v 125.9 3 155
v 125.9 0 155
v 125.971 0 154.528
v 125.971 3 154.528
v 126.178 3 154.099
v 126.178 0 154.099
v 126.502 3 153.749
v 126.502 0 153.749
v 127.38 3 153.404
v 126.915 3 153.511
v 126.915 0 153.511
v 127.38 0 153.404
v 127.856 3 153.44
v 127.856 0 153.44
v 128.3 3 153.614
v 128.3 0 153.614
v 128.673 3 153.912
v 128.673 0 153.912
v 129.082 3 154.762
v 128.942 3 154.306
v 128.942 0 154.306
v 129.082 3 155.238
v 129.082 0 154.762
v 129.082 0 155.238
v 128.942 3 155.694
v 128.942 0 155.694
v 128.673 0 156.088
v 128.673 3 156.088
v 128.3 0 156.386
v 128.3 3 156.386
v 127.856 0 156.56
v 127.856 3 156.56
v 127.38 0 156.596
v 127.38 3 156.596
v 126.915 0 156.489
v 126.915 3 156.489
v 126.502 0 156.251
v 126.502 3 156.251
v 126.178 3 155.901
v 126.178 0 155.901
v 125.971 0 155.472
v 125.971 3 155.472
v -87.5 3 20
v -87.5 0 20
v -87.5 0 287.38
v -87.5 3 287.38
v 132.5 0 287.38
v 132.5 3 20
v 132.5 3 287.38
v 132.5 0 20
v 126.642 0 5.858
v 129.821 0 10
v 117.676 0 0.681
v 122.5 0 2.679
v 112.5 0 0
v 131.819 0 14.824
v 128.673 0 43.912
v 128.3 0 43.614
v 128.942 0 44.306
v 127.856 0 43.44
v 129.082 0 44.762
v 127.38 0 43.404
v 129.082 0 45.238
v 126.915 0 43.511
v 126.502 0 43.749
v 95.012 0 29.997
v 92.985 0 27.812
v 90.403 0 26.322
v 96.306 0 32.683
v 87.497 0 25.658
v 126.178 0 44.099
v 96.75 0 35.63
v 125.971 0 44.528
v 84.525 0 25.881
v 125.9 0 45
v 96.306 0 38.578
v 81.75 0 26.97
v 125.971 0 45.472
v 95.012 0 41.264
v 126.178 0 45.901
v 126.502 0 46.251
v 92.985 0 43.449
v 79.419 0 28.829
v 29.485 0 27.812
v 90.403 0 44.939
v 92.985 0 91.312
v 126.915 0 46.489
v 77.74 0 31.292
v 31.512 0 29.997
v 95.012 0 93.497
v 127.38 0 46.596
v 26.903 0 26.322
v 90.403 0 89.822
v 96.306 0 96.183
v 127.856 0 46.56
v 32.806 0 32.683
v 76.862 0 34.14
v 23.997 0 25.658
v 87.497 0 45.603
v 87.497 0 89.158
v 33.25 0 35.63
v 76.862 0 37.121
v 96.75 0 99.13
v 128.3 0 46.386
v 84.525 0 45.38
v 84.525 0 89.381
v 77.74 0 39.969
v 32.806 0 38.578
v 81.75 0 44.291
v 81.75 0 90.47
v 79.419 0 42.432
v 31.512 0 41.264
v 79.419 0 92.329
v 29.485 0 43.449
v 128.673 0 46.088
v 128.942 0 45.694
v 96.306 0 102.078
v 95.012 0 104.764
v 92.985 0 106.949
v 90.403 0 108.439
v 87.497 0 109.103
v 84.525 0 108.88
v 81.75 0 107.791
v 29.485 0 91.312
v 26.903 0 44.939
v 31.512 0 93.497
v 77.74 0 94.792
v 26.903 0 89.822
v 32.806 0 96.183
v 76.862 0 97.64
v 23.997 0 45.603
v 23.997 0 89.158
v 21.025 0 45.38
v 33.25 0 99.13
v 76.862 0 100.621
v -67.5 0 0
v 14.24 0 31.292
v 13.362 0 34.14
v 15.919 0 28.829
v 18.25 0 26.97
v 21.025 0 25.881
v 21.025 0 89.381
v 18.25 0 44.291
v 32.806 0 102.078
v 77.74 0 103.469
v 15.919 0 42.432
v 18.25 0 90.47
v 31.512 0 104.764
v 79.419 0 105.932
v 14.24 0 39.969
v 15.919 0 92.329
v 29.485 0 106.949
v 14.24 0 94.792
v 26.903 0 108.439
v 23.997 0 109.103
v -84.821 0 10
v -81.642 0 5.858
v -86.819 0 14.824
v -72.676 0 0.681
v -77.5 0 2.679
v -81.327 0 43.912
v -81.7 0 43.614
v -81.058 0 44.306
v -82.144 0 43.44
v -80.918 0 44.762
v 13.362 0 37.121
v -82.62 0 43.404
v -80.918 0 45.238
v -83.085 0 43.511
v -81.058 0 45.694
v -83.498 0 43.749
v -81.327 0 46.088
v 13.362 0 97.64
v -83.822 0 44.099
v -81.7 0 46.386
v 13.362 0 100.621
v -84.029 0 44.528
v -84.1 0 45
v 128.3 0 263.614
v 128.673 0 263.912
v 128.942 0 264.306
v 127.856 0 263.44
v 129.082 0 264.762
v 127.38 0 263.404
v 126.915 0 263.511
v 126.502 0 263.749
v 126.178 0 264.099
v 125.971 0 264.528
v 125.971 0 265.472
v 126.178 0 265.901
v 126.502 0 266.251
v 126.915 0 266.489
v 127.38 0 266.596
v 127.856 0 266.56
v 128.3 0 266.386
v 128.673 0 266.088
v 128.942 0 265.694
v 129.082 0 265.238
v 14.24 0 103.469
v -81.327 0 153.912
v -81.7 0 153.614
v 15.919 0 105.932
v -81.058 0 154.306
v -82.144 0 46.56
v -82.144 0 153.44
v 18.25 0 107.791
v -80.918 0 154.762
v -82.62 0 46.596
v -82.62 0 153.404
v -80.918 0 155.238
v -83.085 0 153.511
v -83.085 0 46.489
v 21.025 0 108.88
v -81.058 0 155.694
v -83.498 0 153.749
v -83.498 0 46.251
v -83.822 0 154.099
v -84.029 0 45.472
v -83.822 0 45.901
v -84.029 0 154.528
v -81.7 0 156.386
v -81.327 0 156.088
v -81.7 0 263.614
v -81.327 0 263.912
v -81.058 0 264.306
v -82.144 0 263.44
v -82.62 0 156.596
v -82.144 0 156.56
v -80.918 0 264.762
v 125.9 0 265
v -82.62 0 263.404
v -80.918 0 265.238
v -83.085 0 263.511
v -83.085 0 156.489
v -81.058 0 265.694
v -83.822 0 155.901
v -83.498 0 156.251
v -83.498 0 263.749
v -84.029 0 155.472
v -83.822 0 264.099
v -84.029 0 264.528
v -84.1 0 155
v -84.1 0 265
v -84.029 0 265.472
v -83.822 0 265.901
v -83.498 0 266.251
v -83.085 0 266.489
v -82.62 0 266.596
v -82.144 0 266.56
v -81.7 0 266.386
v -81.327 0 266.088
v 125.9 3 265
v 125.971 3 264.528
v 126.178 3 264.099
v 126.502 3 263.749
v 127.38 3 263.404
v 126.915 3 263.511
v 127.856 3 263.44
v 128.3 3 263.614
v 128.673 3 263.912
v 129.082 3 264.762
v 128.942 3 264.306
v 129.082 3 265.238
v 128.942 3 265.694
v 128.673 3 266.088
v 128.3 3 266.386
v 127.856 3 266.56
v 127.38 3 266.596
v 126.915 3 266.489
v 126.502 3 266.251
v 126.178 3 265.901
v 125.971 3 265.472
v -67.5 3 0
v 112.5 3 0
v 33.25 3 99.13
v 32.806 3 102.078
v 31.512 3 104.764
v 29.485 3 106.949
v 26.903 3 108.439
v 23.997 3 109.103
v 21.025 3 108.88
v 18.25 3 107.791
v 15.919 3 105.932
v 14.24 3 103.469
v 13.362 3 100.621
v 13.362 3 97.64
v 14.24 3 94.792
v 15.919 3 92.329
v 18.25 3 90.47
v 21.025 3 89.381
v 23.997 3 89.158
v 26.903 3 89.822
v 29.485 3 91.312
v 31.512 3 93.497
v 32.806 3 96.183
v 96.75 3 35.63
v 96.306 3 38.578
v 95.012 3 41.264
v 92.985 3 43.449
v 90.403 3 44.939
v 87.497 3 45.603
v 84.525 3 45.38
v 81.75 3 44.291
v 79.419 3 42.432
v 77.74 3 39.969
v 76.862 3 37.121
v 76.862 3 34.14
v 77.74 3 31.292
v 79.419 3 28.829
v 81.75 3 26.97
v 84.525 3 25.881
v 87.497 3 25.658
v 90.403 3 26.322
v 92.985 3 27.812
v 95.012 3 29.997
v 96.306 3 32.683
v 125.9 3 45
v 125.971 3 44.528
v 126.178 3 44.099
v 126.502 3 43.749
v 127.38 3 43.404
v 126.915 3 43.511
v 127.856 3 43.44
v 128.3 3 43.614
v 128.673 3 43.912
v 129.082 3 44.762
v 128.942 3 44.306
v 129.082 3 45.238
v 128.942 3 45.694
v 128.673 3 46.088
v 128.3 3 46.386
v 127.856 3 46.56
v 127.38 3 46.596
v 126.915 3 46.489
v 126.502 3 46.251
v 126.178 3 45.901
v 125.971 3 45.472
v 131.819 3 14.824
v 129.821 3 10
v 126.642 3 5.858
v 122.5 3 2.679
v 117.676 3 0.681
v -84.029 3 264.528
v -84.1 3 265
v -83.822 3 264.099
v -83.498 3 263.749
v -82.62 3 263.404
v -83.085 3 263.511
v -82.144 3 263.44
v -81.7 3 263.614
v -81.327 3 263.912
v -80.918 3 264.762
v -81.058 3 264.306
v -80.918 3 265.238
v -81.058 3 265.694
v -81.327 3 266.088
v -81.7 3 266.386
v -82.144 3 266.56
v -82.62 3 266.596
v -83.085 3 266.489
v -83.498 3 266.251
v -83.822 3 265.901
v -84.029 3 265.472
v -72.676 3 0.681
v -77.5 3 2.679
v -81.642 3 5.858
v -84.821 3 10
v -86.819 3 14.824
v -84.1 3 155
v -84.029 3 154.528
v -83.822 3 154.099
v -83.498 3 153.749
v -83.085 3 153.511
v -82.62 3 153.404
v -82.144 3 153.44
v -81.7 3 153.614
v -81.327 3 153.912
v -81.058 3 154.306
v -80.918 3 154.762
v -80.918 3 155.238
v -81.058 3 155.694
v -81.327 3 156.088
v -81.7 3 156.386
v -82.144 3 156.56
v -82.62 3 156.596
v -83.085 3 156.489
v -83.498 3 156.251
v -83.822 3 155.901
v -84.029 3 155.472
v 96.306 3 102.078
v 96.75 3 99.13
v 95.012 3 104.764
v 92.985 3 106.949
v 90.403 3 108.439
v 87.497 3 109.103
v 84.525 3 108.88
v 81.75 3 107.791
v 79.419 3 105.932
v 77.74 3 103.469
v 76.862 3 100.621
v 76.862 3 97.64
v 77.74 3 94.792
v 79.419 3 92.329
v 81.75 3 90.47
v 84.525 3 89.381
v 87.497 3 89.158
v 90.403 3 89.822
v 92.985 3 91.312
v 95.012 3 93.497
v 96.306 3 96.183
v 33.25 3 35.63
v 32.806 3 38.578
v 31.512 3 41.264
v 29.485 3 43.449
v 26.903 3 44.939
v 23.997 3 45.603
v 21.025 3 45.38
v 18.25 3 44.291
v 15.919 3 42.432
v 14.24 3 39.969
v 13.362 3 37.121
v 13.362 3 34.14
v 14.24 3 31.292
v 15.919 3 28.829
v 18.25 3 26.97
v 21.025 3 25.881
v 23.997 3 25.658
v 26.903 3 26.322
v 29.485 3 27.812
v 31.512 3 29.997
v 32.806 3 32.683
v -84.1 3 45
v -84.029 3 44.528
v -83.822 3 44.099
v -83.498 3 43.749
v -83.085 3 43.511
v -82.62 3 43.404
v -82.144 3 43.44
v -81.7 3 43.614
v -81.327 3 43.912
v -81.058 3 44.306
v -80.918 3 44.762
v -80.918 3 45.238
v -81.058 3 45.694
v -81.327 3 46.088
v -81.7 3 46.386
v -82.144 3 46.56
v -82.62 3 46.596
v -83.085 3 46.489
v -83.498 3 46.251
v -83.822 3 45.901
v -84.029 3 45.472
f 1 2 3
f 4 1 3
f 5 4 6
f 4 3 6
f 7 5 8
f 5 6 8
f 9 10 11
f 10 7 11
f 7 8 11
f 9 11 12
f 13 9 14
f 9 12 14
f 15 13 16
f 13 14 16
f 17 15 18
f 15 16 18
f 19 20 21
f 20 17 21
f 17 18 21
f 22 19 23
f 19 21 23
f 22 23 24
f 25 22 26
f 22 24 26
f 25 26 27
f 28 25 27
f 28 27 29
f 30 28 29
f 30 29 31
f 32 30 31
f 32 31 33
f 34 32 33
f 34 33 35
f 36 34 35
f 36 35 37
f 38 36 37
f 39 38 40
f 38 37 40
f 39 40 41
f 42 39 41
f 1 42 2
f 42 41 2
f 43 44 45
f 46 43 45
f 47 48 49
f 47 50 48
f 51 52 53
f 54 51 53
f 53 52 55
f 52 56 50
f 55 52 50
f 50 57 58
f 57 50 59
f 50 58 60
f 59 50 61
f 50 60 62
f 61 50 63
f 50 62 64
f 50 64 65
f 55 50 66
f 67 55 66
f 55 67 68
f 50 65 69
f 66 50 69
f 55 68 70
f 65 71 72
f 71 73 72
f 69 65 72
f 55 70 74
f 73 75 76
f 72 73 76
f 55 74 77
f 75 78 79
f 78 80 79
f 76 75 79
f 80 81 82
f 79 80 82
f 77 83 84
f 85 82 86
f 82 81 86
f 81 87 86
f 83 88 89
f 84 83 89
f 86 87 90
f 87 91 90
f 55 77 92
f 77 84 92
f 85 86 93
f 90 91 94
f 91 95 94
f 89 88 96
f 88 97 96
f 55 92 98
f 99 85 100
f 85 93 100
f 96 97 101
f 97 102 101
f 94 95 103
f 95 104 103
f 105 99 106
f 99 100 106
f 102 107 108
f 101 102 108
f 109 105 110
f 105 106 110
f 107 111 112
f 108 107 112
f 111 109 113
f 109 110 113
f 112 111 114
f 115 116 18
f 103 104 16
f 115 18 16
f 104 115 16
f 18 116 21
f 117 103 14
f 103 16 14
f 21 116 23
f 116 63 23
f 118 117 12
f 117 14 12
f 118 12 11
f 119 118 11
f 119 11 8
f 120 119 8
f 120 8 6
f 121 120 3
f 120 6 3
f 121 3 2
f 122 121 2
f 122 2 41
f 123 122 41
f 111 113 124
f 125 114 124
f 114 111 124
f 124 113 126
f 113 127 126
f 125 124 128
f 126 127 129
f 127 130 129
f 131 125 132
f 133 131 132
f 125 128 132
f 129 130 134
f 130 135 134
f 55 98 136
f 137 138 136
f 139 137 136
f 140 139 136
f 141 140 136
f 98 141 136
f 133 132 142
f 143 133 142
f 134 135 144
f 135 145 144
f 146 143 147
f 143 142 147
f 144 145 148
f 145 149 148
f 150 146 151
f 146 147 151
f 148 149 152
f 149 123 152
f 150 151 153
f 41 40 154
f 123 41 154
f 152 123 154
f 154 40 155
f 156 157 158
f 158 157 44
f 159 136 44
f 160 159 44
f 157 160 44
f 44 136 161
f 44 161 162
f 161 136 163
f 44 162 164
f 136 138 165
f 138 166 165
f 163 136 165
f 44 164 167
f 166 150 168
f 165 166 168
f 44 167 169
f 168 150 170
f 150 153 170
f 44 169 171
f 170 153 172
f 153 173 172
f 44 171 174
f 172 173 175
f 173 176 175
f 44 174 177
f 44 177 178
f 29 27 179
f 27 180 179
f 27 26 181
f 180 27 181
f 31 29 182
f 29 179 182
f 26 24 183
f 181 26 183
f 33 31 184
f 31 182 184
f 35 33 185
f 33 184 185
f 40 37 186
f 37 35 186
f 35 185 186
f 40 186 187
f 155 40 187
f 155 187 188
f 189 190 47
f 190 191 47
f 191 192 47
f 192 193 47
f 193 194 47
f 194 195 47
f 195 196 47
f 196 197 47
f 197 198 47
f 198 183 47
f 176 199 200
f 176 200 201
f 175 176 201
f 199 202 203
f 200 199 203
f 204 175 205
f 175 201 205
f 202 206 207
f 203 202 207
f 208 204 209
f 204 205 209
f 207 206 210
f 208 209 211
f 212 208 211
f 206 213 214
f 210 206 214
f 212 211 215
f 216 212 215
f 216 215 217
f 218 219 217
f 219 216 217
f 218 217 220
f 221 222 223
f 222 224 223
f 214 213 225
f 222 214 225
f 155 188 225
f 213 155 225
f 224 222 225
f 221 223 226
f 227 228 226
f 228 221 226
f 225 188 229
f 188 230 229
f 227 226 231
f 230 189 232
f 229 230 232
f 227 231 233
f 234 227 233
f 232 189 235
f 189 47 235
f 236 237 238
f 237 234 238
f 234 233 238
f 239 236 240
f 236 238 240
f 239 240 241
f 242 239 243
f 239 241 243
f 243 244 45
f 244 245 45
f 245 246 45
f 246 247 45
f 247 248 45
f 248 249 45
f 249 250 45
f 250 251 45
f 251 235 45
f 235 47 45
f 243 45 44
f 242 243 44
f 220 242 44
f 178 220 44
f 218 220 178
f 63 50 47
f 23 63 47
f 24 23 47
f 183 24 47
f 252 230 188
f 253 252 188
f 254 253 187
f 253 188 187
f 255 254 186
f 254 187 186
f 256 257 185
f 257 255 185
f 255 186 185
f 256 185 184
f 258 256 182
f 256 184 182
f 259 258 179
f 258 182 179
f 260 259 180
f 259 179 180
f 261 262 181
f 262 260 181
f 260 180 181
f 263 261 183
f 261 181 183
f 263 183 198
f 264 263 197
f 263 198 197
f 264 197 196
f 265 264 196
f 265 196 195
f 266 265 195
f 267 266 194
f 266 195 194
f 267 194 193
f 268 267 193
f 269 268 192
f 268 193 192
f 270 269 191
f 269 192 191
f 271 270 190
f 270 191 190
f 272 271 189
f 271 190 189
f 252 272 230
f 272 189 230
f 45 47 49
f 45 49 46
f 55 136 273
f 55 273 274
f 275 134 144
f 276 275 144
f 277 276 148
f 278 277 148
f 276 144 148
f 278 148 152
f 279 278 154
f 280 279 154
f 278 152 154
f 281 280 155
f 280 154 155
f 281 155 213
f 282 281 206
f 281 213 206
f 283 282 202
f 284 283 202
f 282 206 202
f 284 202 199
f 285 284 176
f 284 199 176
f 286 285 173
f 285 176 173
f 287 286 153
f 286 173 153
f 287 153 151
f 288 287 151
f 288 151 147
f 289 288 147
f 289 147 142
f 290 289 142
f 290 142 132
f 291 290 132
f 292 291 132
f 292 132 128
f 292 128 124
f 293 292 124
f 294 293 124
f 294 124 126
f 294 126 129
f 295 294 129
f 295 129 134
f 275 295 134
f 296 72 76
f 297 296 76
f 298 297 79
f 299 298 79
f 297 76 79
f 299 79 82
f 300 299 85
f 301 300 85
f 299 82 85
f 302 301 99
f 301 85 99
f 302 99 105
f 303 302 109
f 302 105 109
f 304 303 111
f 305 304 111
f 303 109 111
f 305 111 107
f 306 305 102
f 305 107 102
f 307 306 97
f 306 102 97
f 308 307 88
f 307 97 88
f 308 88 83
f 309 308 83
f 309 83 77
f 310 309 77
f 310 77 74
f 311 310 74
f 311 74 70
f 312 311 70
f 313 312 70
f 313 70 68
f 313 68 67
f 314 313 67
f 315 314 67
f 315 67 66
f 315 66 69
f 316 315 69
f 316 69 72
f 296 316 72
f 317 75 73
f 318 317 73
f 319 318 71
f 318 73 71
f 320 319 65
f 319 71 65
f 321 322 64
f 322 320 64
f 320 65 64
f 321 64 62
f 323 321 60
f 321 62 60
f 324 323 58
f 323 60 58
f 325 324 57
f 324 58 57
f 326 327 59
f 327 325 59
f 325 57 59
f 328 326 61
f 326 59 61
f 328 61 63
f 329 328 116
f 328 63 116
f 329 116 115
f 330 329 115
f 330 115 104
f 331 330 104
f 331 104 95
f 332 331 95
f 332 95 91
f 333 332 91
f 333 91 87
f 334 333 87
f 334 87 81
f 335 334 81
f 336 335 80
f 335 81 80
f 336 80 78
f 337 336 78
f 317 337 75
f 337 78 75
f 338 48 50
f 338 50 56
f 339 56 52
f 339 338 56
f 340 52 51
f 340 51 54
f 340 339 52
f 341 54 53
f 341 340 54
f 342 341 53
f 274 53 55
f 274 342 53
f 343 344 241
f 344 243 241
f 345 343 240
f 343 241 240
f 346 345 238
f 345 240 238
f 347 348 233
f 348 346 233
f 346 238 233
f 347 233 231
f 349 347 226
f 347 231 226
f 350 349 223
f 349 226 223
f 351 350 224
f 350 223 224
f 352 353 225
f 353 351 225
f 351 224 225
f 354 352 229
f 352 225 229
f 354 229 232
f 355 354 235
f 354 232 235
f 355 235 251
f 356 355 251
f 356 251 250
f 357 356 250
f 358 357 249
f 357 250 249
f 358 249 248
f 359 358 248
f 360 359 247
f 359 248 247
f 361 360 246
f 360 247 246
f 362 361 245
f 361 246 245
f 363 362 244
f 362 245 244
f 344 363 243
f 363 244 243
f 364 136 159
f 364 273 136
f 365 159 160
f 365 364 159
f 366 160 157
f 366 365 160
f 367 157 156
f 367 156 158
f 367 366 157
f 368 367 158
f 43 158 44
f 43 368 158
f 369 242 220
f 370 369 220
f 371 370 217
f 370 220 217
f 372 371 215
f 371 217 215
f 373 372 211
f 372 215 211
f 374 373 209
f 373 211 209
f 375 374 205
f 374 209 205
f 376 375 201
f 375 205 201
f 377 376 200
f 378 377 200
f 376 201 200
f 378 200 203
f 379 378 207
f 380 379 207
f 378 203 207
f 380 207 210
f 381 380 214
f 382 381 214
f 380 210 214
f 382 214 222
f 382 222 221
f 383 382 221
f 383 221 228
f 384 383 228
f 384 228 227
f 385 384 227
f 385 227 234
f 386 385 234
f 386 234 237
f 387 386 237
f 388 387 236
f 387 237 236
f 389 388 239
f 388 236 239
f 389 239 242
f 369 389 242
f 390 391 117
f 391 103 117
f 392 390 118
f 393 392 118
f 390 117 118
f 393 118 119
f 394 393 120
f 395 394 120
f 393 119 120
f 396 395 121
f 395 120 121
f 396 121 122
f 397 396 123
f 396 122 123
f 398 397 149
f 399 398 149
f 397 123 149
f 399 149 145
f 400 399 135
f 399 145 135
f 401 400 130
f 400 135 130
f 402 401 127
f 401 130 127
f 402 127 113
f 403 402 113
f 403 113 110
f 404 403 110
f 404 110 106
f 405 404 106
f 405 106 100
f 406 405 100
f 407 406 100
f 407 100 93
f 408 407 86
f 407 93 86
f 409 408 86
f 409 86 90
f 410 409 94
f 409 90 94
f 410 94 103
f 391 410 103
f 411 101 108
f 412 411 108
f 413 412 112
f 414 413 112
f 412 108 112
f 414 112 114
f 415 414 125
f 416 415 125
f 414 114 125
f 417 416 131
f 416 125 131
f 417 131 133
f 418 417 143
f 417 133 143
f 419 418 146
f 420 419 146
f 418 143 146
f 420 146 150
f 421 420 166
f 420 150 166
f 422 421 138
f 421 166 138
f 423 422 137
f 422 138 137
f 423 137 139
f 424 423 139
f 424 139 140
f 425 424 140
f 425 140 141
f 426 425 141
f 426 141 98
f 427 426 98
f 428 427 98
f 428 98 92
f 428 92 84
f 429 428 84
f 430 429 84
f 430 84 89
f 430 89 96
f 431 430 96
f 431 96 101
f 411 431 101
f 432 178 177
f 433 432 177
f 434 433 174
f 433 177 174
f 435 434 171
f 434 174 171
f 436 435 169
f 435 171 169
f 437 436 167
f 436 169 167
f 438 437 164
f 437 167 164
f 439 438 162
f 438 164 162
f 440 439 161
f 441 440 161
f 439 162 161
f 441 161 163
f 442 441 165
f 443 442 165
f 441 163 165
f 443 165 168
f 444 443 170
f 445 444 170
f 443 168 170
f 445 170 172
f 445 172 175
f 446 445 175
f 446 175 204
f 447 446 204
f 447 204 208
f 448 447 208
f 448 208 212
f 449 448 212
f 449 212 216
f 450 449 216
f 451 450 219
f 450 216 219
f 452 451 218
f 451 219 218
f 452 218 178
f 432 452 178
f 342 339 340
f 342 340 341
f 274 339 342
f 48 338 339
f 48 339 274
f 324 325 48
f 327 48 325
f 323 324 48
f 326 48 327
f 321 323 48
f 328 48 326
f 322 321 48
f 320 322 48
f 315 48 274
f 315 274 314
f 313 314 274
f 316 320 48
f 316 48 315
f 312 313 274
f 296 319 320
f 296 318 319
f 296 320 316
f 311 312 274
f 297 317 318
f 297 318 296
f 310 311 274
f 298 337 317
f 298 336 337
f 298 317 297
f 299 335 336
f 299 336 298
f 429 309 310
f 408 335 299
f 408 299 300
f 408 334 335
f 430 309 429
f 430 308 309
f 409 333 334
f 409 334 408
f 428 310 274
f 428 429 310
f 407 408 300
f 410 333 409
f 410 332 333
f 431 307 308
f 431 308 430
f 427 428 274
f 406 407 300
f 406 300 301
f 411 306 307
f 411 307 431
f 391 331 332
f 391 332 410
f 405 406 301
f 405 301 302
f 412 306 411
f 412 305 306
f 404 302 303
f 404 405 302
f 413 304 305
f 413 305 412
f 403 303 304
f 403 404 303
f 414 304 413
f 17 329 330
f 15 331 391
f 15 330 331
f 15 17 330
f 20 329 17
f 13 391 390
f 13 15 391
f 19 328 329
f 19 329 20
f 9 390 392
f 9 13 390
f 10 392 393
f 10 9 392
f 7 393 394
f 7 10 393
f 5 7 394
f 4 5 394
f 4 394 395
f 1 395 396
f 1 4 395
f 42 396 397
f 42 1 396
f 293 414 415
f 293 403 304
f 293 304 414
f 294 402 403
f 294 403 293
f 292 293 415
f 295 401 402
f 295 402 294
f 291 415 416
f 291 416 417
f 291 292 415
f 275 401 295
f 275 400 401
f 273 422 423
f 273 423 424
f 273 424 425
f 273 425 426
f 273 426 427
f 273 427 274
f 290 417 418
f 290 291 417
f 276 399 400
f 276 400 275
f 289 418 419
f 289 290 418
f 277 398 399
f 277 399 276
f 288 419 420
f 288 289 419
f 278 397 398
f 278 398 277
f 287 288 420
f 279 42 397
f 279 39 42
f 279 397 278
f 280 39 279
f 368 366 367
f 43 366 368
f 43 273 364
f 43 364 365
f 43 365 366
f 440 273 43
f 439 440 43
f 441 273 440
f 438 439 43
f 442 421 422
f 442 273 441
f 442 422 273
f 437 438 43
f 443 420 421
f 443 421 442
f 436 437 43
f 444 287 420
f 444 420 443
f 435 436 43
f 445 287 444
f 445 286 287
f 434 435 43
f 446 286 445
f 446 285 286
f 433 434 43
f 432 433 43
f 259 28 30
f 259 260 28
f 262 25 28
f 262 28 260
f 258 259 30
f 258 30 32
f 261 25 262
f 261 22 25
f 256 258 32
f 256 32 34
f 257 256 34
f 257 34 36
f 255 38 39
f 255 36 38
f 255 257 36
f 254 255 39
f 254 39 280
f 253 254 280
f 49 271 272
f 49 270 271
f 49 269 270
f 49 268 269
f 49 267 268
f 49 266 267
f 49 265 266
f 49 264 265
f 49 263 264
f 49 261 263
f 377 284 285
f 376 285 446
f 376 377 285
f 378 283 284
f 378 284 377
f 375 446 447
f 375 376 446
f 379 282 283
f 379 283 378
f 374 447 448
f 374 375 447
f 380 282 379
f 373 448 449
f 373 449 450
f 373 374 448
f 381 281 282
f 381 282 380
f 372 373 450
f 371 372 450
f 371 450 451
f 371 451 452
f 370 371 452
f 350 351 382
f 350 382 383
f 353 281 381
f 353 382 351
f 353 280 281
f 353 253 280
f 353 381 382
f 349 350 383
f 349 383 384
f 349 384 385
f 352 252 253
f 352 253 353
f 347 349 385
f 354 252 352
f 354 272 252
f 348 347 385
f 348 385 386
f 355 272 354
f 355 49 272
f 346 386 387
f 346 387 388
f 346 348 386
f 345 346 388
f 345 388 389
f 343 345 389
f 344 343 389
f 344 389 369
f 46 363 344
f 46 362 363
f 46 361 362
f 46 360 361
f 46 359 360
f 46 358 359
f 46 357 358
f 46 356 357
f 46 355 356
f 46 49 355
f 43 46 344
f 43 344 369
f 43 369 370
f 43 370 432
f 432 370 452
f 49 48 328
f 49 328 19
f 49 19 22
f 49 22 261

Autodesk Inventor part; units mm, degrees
ref_plane "YZ Plane" through (0, 0, 0) normal (1, 0, 0) x (0, 1, 0)
ref_plane "XZ Plane" through (0, 0, 0) normal (0, 1, 0) x (-1, 0, 0)
ref_plane "XY Plane" through (0, 0, 0) normal (0, 0, 1) x (1, 0, 0)
sketch "Sketch1" plane through (0, 0, 0) normal (0, 1, 0) x (-1, 0, 0)
  line L0 (-132.5, 287.3805) -> (-122.5, 287.3805)
  line L1 (-132.5, 20) -> (-132.5, 287.3805)
  line L2 (-122.5, 20) -> (-122.5, 287.3805)
  line L3 (77.5, 287.3805) -> (87.5, 287.3805)
  line L4 (77.5, 20) -> (77.5, 287.3805)
  line L5 (87.5, 20) -> (87.5, 287.3805)
  line L6 (82.5, 0) -> (127.5, 0) construction
  line L7 (-132.5, 20) -> (-132.5, 287.3805)
  line L8 (82.5, 45) -> (-127.5, 45)
  line L9 (82.5, 155) -> (-127.5, 155)
  circle A0 centre (-127.5, 265) radius 1.6
  circle A1 centre (-127.5, 155) radius 1.6
  circle A2 centre (-127.5, 45) radius 1.6
  circle A3 centre (82.5, 45) radius 1.6
  circle A4 centre (82.5, 155) radius 1.6
  circle A5 centre (82.5, 265) radius 1.6
  line L10 (-132.5, 287.3805) -> (87.5, 287.3805)
  line L11 (87.5, 287.3805) -> (87.5, 0)
  line L12 (87.5, 0) -> (-132.5, 0)
  line L13 (-132.5, 0) -> (-132.5, 287.3805)
  line L14 (87.5, 0) -> (-132.5, 0)
  line L15 (-132.5, 0) -> (-132.5, -22.8)
  line L16 (-132.5, -22.8) -> (87.5, -22.8)
  line L17 (87.5, -22.8) -> (87.5, 0)
  arc A6 (6, 100) -> (0, 94) centre (6, 94) ccw
  line L18 (0, 0) -> (0, 94)
  line L19 (0, 0) -> (90, 0)
  line L20 (90, 0) -> (90, 94)
  arc A7 (90, 94) -> (84, 100) centre (84, 94) ccw
  line L21 (6, 100) -> (84, 100)
  circle A8 centre (45, 47.3805) radius 11
  circle A9 centre (76.75, 79.1305) radius 5.75
  circle A10 centre (13.25, 15.6305) radius 5.75
  circle A11 centre (76.75, 15.6305) radius 5.75
  circle A12 centre (13.25, 79.1305) radius 5.75
  circle A13 centre (117.5, 135) radius 1.8
  line L22 (112.5, 267.3805) -> (122.5, 267.3805)
  line L23 (112.5, 0) -> (112.5, 267.3805)
  line L24 (112.5, 0) -> (122.5, 0)
  line L25 (122.5, 0) -> (122.5, 267.3805)
  circle A14 centre (117.5, 25) radius 1.8
  circle A15 centre (117.5, 245) radius 1.8
  circle A16 centre (-92.5, 135) radius 1.8
  line L26 (-97.5, 267.3805) -> (-87.5, 267.3805)
  line L27 (-97.5, 0) -> (-97.5, 267.3805)
  line L28 (-97.5, 0) -> (-87.5, 0)
  line L29 (-87.5, 0) -> (-87.5, 267.3805)
  circle A17 centre (-92.5, 245) radius 1.8
  circle A18 centre (-92.5, 25) radius 1.8
  point P0 (-62.5, 0)
  point P1 (52.5, -20)
  dimension "d0" = 45
  dimension "d2" = 110
  dimension "d4" = 3.2
  dimension "d5" = 3.2
  dimension "d6" = 3.2
  dimension "d7" = 3.2
  dimension "d8" = 3.2
  dimension "d9" = 3.2
  dimension "d12" = 22.8
extrude "Extrusion1" add sketch "Sketch1" along normal blind 3 contours L0 L2 L8 L27 L12 L13 L1 | L10 L4 L9 L29 L26 L27 L2 | L9 L27 L8 L2 | L3 L5 A7 L21 L4 | L27 L26 L29 L9 | L9 L29 L8 L27 | L4 L21 A6 L18 L8 L29 L9 | L27 L8 L29 L12 | L5 L11 L12 L18 L8 A8 L4 A9 L21 A7 | L4 A9 L8 A8 L18 A6 L21 | L29 L8 L18 L12 | A9 L4 | L4 A9 | A8 L8 | L8 A8 | A10 | A11 | A12 | A16 | A17 | A18
fillet "Fillet1" radius 20 2 edges at (132.5, 1.5, 0) (-87.5, 1.5, 0)
sketch "Sketch3" plane through (0, 0, 0) normal (0, -1, 0) x (1, 0, 0)
  line L0 (92.3, 110.2305) -> (17.7, 110.2305)
  circle A0 centre (23.25, 99.1305) radius 4.9999
  circle A1 centre (86.75, 99.1305) radius 4.9999
  circle A2 centre (23.25, 35.6305) radius 4.9999
  circle A3 centre (86.75, 35.6305) radius 4.9999
  line L1 (10, 20) -> (10, 114)
  line L2 (100, 20) -> (100, 114)
  line L3 (112.5, 0) -> (-67.5, 0)
  line L4 (132.5, 287.3805) -> (132.5, 20)
  line L5 (-87.5, 20) -> (-87.5, 287.3805)
  line L6 (-87.5, 287.3805) -> (132.5, 287.3805)
  arc A4 (-87.5, 20) -> (-67.5, 0) centre (-67.5, 20) ccw projected
  line L7 (112.5, 0) -> (-67.5, 0) projected
  arc A5 (112.5, 0) -> (132.5, 20) centre (112.5, 20) ccw projected
  line L8 (132.5, 287.3805) -> (132.5, 20) projected
  line L9 (-87.5, 287.3805) -> (132.5, 287.3805) projected
  line L10 (-87.5, 20) -> (-87.5, 287.3805) projected
  circle A6 centre (127.5, 155) radius 1.6 projected
  circle A7 centre (127.5, 45) radius 1.6 projected
  circle A8 centre (-82.5, 45) radius 1.6 projected
  circle A9 centre (-82.5, 155) radius 1.6 projected
  circle A10 centre (127.5, 265) radius 1.6 projected
  circle A11 centre (-82.5, 265) radius 1.6 projected
  circle A12 centre (86.75, 99.1305) radius 10
  circle A13 centre (86.75, 35.6305) radius 10
  circle A14 centre (23.25, 99.1305) radius 10
  circle A15 centre (23.25, 35.6305) radius 10
  point P0 (0, 0)
  dimension "d18" = 20
  dimension "d19" = 20
  dimension "d20" = 20
  dimension "d21" = 20
extrude "Extrusion2" cut sketch "Sketch3" against normal up to surface (3 mm away) contours A0 | A1 | A2 | A3 | A12 | A13 | A14 | A15
equation "\"BendRadius\" = Thickness"
equation "\"BendReliefWidth\" = Thickness"
equation "\"BendReliefDepth\" = 0.5 * Thickness"
equation "\"CornerReliefSize\" = 4 * Thickness"
equation "\"MinimumRemnant\" = 2 * Thickness"
equation "\"TransitionRadius\" = BendRadius"
equation "\"JacobiRadiusSize\" = Thickness"
equation "\"GapSize\" = Thickness"
equation "\"Thickness\" = 0.5"
properties part number "obudowa_zewnetrzna_przod" material "ABS Plastic"
